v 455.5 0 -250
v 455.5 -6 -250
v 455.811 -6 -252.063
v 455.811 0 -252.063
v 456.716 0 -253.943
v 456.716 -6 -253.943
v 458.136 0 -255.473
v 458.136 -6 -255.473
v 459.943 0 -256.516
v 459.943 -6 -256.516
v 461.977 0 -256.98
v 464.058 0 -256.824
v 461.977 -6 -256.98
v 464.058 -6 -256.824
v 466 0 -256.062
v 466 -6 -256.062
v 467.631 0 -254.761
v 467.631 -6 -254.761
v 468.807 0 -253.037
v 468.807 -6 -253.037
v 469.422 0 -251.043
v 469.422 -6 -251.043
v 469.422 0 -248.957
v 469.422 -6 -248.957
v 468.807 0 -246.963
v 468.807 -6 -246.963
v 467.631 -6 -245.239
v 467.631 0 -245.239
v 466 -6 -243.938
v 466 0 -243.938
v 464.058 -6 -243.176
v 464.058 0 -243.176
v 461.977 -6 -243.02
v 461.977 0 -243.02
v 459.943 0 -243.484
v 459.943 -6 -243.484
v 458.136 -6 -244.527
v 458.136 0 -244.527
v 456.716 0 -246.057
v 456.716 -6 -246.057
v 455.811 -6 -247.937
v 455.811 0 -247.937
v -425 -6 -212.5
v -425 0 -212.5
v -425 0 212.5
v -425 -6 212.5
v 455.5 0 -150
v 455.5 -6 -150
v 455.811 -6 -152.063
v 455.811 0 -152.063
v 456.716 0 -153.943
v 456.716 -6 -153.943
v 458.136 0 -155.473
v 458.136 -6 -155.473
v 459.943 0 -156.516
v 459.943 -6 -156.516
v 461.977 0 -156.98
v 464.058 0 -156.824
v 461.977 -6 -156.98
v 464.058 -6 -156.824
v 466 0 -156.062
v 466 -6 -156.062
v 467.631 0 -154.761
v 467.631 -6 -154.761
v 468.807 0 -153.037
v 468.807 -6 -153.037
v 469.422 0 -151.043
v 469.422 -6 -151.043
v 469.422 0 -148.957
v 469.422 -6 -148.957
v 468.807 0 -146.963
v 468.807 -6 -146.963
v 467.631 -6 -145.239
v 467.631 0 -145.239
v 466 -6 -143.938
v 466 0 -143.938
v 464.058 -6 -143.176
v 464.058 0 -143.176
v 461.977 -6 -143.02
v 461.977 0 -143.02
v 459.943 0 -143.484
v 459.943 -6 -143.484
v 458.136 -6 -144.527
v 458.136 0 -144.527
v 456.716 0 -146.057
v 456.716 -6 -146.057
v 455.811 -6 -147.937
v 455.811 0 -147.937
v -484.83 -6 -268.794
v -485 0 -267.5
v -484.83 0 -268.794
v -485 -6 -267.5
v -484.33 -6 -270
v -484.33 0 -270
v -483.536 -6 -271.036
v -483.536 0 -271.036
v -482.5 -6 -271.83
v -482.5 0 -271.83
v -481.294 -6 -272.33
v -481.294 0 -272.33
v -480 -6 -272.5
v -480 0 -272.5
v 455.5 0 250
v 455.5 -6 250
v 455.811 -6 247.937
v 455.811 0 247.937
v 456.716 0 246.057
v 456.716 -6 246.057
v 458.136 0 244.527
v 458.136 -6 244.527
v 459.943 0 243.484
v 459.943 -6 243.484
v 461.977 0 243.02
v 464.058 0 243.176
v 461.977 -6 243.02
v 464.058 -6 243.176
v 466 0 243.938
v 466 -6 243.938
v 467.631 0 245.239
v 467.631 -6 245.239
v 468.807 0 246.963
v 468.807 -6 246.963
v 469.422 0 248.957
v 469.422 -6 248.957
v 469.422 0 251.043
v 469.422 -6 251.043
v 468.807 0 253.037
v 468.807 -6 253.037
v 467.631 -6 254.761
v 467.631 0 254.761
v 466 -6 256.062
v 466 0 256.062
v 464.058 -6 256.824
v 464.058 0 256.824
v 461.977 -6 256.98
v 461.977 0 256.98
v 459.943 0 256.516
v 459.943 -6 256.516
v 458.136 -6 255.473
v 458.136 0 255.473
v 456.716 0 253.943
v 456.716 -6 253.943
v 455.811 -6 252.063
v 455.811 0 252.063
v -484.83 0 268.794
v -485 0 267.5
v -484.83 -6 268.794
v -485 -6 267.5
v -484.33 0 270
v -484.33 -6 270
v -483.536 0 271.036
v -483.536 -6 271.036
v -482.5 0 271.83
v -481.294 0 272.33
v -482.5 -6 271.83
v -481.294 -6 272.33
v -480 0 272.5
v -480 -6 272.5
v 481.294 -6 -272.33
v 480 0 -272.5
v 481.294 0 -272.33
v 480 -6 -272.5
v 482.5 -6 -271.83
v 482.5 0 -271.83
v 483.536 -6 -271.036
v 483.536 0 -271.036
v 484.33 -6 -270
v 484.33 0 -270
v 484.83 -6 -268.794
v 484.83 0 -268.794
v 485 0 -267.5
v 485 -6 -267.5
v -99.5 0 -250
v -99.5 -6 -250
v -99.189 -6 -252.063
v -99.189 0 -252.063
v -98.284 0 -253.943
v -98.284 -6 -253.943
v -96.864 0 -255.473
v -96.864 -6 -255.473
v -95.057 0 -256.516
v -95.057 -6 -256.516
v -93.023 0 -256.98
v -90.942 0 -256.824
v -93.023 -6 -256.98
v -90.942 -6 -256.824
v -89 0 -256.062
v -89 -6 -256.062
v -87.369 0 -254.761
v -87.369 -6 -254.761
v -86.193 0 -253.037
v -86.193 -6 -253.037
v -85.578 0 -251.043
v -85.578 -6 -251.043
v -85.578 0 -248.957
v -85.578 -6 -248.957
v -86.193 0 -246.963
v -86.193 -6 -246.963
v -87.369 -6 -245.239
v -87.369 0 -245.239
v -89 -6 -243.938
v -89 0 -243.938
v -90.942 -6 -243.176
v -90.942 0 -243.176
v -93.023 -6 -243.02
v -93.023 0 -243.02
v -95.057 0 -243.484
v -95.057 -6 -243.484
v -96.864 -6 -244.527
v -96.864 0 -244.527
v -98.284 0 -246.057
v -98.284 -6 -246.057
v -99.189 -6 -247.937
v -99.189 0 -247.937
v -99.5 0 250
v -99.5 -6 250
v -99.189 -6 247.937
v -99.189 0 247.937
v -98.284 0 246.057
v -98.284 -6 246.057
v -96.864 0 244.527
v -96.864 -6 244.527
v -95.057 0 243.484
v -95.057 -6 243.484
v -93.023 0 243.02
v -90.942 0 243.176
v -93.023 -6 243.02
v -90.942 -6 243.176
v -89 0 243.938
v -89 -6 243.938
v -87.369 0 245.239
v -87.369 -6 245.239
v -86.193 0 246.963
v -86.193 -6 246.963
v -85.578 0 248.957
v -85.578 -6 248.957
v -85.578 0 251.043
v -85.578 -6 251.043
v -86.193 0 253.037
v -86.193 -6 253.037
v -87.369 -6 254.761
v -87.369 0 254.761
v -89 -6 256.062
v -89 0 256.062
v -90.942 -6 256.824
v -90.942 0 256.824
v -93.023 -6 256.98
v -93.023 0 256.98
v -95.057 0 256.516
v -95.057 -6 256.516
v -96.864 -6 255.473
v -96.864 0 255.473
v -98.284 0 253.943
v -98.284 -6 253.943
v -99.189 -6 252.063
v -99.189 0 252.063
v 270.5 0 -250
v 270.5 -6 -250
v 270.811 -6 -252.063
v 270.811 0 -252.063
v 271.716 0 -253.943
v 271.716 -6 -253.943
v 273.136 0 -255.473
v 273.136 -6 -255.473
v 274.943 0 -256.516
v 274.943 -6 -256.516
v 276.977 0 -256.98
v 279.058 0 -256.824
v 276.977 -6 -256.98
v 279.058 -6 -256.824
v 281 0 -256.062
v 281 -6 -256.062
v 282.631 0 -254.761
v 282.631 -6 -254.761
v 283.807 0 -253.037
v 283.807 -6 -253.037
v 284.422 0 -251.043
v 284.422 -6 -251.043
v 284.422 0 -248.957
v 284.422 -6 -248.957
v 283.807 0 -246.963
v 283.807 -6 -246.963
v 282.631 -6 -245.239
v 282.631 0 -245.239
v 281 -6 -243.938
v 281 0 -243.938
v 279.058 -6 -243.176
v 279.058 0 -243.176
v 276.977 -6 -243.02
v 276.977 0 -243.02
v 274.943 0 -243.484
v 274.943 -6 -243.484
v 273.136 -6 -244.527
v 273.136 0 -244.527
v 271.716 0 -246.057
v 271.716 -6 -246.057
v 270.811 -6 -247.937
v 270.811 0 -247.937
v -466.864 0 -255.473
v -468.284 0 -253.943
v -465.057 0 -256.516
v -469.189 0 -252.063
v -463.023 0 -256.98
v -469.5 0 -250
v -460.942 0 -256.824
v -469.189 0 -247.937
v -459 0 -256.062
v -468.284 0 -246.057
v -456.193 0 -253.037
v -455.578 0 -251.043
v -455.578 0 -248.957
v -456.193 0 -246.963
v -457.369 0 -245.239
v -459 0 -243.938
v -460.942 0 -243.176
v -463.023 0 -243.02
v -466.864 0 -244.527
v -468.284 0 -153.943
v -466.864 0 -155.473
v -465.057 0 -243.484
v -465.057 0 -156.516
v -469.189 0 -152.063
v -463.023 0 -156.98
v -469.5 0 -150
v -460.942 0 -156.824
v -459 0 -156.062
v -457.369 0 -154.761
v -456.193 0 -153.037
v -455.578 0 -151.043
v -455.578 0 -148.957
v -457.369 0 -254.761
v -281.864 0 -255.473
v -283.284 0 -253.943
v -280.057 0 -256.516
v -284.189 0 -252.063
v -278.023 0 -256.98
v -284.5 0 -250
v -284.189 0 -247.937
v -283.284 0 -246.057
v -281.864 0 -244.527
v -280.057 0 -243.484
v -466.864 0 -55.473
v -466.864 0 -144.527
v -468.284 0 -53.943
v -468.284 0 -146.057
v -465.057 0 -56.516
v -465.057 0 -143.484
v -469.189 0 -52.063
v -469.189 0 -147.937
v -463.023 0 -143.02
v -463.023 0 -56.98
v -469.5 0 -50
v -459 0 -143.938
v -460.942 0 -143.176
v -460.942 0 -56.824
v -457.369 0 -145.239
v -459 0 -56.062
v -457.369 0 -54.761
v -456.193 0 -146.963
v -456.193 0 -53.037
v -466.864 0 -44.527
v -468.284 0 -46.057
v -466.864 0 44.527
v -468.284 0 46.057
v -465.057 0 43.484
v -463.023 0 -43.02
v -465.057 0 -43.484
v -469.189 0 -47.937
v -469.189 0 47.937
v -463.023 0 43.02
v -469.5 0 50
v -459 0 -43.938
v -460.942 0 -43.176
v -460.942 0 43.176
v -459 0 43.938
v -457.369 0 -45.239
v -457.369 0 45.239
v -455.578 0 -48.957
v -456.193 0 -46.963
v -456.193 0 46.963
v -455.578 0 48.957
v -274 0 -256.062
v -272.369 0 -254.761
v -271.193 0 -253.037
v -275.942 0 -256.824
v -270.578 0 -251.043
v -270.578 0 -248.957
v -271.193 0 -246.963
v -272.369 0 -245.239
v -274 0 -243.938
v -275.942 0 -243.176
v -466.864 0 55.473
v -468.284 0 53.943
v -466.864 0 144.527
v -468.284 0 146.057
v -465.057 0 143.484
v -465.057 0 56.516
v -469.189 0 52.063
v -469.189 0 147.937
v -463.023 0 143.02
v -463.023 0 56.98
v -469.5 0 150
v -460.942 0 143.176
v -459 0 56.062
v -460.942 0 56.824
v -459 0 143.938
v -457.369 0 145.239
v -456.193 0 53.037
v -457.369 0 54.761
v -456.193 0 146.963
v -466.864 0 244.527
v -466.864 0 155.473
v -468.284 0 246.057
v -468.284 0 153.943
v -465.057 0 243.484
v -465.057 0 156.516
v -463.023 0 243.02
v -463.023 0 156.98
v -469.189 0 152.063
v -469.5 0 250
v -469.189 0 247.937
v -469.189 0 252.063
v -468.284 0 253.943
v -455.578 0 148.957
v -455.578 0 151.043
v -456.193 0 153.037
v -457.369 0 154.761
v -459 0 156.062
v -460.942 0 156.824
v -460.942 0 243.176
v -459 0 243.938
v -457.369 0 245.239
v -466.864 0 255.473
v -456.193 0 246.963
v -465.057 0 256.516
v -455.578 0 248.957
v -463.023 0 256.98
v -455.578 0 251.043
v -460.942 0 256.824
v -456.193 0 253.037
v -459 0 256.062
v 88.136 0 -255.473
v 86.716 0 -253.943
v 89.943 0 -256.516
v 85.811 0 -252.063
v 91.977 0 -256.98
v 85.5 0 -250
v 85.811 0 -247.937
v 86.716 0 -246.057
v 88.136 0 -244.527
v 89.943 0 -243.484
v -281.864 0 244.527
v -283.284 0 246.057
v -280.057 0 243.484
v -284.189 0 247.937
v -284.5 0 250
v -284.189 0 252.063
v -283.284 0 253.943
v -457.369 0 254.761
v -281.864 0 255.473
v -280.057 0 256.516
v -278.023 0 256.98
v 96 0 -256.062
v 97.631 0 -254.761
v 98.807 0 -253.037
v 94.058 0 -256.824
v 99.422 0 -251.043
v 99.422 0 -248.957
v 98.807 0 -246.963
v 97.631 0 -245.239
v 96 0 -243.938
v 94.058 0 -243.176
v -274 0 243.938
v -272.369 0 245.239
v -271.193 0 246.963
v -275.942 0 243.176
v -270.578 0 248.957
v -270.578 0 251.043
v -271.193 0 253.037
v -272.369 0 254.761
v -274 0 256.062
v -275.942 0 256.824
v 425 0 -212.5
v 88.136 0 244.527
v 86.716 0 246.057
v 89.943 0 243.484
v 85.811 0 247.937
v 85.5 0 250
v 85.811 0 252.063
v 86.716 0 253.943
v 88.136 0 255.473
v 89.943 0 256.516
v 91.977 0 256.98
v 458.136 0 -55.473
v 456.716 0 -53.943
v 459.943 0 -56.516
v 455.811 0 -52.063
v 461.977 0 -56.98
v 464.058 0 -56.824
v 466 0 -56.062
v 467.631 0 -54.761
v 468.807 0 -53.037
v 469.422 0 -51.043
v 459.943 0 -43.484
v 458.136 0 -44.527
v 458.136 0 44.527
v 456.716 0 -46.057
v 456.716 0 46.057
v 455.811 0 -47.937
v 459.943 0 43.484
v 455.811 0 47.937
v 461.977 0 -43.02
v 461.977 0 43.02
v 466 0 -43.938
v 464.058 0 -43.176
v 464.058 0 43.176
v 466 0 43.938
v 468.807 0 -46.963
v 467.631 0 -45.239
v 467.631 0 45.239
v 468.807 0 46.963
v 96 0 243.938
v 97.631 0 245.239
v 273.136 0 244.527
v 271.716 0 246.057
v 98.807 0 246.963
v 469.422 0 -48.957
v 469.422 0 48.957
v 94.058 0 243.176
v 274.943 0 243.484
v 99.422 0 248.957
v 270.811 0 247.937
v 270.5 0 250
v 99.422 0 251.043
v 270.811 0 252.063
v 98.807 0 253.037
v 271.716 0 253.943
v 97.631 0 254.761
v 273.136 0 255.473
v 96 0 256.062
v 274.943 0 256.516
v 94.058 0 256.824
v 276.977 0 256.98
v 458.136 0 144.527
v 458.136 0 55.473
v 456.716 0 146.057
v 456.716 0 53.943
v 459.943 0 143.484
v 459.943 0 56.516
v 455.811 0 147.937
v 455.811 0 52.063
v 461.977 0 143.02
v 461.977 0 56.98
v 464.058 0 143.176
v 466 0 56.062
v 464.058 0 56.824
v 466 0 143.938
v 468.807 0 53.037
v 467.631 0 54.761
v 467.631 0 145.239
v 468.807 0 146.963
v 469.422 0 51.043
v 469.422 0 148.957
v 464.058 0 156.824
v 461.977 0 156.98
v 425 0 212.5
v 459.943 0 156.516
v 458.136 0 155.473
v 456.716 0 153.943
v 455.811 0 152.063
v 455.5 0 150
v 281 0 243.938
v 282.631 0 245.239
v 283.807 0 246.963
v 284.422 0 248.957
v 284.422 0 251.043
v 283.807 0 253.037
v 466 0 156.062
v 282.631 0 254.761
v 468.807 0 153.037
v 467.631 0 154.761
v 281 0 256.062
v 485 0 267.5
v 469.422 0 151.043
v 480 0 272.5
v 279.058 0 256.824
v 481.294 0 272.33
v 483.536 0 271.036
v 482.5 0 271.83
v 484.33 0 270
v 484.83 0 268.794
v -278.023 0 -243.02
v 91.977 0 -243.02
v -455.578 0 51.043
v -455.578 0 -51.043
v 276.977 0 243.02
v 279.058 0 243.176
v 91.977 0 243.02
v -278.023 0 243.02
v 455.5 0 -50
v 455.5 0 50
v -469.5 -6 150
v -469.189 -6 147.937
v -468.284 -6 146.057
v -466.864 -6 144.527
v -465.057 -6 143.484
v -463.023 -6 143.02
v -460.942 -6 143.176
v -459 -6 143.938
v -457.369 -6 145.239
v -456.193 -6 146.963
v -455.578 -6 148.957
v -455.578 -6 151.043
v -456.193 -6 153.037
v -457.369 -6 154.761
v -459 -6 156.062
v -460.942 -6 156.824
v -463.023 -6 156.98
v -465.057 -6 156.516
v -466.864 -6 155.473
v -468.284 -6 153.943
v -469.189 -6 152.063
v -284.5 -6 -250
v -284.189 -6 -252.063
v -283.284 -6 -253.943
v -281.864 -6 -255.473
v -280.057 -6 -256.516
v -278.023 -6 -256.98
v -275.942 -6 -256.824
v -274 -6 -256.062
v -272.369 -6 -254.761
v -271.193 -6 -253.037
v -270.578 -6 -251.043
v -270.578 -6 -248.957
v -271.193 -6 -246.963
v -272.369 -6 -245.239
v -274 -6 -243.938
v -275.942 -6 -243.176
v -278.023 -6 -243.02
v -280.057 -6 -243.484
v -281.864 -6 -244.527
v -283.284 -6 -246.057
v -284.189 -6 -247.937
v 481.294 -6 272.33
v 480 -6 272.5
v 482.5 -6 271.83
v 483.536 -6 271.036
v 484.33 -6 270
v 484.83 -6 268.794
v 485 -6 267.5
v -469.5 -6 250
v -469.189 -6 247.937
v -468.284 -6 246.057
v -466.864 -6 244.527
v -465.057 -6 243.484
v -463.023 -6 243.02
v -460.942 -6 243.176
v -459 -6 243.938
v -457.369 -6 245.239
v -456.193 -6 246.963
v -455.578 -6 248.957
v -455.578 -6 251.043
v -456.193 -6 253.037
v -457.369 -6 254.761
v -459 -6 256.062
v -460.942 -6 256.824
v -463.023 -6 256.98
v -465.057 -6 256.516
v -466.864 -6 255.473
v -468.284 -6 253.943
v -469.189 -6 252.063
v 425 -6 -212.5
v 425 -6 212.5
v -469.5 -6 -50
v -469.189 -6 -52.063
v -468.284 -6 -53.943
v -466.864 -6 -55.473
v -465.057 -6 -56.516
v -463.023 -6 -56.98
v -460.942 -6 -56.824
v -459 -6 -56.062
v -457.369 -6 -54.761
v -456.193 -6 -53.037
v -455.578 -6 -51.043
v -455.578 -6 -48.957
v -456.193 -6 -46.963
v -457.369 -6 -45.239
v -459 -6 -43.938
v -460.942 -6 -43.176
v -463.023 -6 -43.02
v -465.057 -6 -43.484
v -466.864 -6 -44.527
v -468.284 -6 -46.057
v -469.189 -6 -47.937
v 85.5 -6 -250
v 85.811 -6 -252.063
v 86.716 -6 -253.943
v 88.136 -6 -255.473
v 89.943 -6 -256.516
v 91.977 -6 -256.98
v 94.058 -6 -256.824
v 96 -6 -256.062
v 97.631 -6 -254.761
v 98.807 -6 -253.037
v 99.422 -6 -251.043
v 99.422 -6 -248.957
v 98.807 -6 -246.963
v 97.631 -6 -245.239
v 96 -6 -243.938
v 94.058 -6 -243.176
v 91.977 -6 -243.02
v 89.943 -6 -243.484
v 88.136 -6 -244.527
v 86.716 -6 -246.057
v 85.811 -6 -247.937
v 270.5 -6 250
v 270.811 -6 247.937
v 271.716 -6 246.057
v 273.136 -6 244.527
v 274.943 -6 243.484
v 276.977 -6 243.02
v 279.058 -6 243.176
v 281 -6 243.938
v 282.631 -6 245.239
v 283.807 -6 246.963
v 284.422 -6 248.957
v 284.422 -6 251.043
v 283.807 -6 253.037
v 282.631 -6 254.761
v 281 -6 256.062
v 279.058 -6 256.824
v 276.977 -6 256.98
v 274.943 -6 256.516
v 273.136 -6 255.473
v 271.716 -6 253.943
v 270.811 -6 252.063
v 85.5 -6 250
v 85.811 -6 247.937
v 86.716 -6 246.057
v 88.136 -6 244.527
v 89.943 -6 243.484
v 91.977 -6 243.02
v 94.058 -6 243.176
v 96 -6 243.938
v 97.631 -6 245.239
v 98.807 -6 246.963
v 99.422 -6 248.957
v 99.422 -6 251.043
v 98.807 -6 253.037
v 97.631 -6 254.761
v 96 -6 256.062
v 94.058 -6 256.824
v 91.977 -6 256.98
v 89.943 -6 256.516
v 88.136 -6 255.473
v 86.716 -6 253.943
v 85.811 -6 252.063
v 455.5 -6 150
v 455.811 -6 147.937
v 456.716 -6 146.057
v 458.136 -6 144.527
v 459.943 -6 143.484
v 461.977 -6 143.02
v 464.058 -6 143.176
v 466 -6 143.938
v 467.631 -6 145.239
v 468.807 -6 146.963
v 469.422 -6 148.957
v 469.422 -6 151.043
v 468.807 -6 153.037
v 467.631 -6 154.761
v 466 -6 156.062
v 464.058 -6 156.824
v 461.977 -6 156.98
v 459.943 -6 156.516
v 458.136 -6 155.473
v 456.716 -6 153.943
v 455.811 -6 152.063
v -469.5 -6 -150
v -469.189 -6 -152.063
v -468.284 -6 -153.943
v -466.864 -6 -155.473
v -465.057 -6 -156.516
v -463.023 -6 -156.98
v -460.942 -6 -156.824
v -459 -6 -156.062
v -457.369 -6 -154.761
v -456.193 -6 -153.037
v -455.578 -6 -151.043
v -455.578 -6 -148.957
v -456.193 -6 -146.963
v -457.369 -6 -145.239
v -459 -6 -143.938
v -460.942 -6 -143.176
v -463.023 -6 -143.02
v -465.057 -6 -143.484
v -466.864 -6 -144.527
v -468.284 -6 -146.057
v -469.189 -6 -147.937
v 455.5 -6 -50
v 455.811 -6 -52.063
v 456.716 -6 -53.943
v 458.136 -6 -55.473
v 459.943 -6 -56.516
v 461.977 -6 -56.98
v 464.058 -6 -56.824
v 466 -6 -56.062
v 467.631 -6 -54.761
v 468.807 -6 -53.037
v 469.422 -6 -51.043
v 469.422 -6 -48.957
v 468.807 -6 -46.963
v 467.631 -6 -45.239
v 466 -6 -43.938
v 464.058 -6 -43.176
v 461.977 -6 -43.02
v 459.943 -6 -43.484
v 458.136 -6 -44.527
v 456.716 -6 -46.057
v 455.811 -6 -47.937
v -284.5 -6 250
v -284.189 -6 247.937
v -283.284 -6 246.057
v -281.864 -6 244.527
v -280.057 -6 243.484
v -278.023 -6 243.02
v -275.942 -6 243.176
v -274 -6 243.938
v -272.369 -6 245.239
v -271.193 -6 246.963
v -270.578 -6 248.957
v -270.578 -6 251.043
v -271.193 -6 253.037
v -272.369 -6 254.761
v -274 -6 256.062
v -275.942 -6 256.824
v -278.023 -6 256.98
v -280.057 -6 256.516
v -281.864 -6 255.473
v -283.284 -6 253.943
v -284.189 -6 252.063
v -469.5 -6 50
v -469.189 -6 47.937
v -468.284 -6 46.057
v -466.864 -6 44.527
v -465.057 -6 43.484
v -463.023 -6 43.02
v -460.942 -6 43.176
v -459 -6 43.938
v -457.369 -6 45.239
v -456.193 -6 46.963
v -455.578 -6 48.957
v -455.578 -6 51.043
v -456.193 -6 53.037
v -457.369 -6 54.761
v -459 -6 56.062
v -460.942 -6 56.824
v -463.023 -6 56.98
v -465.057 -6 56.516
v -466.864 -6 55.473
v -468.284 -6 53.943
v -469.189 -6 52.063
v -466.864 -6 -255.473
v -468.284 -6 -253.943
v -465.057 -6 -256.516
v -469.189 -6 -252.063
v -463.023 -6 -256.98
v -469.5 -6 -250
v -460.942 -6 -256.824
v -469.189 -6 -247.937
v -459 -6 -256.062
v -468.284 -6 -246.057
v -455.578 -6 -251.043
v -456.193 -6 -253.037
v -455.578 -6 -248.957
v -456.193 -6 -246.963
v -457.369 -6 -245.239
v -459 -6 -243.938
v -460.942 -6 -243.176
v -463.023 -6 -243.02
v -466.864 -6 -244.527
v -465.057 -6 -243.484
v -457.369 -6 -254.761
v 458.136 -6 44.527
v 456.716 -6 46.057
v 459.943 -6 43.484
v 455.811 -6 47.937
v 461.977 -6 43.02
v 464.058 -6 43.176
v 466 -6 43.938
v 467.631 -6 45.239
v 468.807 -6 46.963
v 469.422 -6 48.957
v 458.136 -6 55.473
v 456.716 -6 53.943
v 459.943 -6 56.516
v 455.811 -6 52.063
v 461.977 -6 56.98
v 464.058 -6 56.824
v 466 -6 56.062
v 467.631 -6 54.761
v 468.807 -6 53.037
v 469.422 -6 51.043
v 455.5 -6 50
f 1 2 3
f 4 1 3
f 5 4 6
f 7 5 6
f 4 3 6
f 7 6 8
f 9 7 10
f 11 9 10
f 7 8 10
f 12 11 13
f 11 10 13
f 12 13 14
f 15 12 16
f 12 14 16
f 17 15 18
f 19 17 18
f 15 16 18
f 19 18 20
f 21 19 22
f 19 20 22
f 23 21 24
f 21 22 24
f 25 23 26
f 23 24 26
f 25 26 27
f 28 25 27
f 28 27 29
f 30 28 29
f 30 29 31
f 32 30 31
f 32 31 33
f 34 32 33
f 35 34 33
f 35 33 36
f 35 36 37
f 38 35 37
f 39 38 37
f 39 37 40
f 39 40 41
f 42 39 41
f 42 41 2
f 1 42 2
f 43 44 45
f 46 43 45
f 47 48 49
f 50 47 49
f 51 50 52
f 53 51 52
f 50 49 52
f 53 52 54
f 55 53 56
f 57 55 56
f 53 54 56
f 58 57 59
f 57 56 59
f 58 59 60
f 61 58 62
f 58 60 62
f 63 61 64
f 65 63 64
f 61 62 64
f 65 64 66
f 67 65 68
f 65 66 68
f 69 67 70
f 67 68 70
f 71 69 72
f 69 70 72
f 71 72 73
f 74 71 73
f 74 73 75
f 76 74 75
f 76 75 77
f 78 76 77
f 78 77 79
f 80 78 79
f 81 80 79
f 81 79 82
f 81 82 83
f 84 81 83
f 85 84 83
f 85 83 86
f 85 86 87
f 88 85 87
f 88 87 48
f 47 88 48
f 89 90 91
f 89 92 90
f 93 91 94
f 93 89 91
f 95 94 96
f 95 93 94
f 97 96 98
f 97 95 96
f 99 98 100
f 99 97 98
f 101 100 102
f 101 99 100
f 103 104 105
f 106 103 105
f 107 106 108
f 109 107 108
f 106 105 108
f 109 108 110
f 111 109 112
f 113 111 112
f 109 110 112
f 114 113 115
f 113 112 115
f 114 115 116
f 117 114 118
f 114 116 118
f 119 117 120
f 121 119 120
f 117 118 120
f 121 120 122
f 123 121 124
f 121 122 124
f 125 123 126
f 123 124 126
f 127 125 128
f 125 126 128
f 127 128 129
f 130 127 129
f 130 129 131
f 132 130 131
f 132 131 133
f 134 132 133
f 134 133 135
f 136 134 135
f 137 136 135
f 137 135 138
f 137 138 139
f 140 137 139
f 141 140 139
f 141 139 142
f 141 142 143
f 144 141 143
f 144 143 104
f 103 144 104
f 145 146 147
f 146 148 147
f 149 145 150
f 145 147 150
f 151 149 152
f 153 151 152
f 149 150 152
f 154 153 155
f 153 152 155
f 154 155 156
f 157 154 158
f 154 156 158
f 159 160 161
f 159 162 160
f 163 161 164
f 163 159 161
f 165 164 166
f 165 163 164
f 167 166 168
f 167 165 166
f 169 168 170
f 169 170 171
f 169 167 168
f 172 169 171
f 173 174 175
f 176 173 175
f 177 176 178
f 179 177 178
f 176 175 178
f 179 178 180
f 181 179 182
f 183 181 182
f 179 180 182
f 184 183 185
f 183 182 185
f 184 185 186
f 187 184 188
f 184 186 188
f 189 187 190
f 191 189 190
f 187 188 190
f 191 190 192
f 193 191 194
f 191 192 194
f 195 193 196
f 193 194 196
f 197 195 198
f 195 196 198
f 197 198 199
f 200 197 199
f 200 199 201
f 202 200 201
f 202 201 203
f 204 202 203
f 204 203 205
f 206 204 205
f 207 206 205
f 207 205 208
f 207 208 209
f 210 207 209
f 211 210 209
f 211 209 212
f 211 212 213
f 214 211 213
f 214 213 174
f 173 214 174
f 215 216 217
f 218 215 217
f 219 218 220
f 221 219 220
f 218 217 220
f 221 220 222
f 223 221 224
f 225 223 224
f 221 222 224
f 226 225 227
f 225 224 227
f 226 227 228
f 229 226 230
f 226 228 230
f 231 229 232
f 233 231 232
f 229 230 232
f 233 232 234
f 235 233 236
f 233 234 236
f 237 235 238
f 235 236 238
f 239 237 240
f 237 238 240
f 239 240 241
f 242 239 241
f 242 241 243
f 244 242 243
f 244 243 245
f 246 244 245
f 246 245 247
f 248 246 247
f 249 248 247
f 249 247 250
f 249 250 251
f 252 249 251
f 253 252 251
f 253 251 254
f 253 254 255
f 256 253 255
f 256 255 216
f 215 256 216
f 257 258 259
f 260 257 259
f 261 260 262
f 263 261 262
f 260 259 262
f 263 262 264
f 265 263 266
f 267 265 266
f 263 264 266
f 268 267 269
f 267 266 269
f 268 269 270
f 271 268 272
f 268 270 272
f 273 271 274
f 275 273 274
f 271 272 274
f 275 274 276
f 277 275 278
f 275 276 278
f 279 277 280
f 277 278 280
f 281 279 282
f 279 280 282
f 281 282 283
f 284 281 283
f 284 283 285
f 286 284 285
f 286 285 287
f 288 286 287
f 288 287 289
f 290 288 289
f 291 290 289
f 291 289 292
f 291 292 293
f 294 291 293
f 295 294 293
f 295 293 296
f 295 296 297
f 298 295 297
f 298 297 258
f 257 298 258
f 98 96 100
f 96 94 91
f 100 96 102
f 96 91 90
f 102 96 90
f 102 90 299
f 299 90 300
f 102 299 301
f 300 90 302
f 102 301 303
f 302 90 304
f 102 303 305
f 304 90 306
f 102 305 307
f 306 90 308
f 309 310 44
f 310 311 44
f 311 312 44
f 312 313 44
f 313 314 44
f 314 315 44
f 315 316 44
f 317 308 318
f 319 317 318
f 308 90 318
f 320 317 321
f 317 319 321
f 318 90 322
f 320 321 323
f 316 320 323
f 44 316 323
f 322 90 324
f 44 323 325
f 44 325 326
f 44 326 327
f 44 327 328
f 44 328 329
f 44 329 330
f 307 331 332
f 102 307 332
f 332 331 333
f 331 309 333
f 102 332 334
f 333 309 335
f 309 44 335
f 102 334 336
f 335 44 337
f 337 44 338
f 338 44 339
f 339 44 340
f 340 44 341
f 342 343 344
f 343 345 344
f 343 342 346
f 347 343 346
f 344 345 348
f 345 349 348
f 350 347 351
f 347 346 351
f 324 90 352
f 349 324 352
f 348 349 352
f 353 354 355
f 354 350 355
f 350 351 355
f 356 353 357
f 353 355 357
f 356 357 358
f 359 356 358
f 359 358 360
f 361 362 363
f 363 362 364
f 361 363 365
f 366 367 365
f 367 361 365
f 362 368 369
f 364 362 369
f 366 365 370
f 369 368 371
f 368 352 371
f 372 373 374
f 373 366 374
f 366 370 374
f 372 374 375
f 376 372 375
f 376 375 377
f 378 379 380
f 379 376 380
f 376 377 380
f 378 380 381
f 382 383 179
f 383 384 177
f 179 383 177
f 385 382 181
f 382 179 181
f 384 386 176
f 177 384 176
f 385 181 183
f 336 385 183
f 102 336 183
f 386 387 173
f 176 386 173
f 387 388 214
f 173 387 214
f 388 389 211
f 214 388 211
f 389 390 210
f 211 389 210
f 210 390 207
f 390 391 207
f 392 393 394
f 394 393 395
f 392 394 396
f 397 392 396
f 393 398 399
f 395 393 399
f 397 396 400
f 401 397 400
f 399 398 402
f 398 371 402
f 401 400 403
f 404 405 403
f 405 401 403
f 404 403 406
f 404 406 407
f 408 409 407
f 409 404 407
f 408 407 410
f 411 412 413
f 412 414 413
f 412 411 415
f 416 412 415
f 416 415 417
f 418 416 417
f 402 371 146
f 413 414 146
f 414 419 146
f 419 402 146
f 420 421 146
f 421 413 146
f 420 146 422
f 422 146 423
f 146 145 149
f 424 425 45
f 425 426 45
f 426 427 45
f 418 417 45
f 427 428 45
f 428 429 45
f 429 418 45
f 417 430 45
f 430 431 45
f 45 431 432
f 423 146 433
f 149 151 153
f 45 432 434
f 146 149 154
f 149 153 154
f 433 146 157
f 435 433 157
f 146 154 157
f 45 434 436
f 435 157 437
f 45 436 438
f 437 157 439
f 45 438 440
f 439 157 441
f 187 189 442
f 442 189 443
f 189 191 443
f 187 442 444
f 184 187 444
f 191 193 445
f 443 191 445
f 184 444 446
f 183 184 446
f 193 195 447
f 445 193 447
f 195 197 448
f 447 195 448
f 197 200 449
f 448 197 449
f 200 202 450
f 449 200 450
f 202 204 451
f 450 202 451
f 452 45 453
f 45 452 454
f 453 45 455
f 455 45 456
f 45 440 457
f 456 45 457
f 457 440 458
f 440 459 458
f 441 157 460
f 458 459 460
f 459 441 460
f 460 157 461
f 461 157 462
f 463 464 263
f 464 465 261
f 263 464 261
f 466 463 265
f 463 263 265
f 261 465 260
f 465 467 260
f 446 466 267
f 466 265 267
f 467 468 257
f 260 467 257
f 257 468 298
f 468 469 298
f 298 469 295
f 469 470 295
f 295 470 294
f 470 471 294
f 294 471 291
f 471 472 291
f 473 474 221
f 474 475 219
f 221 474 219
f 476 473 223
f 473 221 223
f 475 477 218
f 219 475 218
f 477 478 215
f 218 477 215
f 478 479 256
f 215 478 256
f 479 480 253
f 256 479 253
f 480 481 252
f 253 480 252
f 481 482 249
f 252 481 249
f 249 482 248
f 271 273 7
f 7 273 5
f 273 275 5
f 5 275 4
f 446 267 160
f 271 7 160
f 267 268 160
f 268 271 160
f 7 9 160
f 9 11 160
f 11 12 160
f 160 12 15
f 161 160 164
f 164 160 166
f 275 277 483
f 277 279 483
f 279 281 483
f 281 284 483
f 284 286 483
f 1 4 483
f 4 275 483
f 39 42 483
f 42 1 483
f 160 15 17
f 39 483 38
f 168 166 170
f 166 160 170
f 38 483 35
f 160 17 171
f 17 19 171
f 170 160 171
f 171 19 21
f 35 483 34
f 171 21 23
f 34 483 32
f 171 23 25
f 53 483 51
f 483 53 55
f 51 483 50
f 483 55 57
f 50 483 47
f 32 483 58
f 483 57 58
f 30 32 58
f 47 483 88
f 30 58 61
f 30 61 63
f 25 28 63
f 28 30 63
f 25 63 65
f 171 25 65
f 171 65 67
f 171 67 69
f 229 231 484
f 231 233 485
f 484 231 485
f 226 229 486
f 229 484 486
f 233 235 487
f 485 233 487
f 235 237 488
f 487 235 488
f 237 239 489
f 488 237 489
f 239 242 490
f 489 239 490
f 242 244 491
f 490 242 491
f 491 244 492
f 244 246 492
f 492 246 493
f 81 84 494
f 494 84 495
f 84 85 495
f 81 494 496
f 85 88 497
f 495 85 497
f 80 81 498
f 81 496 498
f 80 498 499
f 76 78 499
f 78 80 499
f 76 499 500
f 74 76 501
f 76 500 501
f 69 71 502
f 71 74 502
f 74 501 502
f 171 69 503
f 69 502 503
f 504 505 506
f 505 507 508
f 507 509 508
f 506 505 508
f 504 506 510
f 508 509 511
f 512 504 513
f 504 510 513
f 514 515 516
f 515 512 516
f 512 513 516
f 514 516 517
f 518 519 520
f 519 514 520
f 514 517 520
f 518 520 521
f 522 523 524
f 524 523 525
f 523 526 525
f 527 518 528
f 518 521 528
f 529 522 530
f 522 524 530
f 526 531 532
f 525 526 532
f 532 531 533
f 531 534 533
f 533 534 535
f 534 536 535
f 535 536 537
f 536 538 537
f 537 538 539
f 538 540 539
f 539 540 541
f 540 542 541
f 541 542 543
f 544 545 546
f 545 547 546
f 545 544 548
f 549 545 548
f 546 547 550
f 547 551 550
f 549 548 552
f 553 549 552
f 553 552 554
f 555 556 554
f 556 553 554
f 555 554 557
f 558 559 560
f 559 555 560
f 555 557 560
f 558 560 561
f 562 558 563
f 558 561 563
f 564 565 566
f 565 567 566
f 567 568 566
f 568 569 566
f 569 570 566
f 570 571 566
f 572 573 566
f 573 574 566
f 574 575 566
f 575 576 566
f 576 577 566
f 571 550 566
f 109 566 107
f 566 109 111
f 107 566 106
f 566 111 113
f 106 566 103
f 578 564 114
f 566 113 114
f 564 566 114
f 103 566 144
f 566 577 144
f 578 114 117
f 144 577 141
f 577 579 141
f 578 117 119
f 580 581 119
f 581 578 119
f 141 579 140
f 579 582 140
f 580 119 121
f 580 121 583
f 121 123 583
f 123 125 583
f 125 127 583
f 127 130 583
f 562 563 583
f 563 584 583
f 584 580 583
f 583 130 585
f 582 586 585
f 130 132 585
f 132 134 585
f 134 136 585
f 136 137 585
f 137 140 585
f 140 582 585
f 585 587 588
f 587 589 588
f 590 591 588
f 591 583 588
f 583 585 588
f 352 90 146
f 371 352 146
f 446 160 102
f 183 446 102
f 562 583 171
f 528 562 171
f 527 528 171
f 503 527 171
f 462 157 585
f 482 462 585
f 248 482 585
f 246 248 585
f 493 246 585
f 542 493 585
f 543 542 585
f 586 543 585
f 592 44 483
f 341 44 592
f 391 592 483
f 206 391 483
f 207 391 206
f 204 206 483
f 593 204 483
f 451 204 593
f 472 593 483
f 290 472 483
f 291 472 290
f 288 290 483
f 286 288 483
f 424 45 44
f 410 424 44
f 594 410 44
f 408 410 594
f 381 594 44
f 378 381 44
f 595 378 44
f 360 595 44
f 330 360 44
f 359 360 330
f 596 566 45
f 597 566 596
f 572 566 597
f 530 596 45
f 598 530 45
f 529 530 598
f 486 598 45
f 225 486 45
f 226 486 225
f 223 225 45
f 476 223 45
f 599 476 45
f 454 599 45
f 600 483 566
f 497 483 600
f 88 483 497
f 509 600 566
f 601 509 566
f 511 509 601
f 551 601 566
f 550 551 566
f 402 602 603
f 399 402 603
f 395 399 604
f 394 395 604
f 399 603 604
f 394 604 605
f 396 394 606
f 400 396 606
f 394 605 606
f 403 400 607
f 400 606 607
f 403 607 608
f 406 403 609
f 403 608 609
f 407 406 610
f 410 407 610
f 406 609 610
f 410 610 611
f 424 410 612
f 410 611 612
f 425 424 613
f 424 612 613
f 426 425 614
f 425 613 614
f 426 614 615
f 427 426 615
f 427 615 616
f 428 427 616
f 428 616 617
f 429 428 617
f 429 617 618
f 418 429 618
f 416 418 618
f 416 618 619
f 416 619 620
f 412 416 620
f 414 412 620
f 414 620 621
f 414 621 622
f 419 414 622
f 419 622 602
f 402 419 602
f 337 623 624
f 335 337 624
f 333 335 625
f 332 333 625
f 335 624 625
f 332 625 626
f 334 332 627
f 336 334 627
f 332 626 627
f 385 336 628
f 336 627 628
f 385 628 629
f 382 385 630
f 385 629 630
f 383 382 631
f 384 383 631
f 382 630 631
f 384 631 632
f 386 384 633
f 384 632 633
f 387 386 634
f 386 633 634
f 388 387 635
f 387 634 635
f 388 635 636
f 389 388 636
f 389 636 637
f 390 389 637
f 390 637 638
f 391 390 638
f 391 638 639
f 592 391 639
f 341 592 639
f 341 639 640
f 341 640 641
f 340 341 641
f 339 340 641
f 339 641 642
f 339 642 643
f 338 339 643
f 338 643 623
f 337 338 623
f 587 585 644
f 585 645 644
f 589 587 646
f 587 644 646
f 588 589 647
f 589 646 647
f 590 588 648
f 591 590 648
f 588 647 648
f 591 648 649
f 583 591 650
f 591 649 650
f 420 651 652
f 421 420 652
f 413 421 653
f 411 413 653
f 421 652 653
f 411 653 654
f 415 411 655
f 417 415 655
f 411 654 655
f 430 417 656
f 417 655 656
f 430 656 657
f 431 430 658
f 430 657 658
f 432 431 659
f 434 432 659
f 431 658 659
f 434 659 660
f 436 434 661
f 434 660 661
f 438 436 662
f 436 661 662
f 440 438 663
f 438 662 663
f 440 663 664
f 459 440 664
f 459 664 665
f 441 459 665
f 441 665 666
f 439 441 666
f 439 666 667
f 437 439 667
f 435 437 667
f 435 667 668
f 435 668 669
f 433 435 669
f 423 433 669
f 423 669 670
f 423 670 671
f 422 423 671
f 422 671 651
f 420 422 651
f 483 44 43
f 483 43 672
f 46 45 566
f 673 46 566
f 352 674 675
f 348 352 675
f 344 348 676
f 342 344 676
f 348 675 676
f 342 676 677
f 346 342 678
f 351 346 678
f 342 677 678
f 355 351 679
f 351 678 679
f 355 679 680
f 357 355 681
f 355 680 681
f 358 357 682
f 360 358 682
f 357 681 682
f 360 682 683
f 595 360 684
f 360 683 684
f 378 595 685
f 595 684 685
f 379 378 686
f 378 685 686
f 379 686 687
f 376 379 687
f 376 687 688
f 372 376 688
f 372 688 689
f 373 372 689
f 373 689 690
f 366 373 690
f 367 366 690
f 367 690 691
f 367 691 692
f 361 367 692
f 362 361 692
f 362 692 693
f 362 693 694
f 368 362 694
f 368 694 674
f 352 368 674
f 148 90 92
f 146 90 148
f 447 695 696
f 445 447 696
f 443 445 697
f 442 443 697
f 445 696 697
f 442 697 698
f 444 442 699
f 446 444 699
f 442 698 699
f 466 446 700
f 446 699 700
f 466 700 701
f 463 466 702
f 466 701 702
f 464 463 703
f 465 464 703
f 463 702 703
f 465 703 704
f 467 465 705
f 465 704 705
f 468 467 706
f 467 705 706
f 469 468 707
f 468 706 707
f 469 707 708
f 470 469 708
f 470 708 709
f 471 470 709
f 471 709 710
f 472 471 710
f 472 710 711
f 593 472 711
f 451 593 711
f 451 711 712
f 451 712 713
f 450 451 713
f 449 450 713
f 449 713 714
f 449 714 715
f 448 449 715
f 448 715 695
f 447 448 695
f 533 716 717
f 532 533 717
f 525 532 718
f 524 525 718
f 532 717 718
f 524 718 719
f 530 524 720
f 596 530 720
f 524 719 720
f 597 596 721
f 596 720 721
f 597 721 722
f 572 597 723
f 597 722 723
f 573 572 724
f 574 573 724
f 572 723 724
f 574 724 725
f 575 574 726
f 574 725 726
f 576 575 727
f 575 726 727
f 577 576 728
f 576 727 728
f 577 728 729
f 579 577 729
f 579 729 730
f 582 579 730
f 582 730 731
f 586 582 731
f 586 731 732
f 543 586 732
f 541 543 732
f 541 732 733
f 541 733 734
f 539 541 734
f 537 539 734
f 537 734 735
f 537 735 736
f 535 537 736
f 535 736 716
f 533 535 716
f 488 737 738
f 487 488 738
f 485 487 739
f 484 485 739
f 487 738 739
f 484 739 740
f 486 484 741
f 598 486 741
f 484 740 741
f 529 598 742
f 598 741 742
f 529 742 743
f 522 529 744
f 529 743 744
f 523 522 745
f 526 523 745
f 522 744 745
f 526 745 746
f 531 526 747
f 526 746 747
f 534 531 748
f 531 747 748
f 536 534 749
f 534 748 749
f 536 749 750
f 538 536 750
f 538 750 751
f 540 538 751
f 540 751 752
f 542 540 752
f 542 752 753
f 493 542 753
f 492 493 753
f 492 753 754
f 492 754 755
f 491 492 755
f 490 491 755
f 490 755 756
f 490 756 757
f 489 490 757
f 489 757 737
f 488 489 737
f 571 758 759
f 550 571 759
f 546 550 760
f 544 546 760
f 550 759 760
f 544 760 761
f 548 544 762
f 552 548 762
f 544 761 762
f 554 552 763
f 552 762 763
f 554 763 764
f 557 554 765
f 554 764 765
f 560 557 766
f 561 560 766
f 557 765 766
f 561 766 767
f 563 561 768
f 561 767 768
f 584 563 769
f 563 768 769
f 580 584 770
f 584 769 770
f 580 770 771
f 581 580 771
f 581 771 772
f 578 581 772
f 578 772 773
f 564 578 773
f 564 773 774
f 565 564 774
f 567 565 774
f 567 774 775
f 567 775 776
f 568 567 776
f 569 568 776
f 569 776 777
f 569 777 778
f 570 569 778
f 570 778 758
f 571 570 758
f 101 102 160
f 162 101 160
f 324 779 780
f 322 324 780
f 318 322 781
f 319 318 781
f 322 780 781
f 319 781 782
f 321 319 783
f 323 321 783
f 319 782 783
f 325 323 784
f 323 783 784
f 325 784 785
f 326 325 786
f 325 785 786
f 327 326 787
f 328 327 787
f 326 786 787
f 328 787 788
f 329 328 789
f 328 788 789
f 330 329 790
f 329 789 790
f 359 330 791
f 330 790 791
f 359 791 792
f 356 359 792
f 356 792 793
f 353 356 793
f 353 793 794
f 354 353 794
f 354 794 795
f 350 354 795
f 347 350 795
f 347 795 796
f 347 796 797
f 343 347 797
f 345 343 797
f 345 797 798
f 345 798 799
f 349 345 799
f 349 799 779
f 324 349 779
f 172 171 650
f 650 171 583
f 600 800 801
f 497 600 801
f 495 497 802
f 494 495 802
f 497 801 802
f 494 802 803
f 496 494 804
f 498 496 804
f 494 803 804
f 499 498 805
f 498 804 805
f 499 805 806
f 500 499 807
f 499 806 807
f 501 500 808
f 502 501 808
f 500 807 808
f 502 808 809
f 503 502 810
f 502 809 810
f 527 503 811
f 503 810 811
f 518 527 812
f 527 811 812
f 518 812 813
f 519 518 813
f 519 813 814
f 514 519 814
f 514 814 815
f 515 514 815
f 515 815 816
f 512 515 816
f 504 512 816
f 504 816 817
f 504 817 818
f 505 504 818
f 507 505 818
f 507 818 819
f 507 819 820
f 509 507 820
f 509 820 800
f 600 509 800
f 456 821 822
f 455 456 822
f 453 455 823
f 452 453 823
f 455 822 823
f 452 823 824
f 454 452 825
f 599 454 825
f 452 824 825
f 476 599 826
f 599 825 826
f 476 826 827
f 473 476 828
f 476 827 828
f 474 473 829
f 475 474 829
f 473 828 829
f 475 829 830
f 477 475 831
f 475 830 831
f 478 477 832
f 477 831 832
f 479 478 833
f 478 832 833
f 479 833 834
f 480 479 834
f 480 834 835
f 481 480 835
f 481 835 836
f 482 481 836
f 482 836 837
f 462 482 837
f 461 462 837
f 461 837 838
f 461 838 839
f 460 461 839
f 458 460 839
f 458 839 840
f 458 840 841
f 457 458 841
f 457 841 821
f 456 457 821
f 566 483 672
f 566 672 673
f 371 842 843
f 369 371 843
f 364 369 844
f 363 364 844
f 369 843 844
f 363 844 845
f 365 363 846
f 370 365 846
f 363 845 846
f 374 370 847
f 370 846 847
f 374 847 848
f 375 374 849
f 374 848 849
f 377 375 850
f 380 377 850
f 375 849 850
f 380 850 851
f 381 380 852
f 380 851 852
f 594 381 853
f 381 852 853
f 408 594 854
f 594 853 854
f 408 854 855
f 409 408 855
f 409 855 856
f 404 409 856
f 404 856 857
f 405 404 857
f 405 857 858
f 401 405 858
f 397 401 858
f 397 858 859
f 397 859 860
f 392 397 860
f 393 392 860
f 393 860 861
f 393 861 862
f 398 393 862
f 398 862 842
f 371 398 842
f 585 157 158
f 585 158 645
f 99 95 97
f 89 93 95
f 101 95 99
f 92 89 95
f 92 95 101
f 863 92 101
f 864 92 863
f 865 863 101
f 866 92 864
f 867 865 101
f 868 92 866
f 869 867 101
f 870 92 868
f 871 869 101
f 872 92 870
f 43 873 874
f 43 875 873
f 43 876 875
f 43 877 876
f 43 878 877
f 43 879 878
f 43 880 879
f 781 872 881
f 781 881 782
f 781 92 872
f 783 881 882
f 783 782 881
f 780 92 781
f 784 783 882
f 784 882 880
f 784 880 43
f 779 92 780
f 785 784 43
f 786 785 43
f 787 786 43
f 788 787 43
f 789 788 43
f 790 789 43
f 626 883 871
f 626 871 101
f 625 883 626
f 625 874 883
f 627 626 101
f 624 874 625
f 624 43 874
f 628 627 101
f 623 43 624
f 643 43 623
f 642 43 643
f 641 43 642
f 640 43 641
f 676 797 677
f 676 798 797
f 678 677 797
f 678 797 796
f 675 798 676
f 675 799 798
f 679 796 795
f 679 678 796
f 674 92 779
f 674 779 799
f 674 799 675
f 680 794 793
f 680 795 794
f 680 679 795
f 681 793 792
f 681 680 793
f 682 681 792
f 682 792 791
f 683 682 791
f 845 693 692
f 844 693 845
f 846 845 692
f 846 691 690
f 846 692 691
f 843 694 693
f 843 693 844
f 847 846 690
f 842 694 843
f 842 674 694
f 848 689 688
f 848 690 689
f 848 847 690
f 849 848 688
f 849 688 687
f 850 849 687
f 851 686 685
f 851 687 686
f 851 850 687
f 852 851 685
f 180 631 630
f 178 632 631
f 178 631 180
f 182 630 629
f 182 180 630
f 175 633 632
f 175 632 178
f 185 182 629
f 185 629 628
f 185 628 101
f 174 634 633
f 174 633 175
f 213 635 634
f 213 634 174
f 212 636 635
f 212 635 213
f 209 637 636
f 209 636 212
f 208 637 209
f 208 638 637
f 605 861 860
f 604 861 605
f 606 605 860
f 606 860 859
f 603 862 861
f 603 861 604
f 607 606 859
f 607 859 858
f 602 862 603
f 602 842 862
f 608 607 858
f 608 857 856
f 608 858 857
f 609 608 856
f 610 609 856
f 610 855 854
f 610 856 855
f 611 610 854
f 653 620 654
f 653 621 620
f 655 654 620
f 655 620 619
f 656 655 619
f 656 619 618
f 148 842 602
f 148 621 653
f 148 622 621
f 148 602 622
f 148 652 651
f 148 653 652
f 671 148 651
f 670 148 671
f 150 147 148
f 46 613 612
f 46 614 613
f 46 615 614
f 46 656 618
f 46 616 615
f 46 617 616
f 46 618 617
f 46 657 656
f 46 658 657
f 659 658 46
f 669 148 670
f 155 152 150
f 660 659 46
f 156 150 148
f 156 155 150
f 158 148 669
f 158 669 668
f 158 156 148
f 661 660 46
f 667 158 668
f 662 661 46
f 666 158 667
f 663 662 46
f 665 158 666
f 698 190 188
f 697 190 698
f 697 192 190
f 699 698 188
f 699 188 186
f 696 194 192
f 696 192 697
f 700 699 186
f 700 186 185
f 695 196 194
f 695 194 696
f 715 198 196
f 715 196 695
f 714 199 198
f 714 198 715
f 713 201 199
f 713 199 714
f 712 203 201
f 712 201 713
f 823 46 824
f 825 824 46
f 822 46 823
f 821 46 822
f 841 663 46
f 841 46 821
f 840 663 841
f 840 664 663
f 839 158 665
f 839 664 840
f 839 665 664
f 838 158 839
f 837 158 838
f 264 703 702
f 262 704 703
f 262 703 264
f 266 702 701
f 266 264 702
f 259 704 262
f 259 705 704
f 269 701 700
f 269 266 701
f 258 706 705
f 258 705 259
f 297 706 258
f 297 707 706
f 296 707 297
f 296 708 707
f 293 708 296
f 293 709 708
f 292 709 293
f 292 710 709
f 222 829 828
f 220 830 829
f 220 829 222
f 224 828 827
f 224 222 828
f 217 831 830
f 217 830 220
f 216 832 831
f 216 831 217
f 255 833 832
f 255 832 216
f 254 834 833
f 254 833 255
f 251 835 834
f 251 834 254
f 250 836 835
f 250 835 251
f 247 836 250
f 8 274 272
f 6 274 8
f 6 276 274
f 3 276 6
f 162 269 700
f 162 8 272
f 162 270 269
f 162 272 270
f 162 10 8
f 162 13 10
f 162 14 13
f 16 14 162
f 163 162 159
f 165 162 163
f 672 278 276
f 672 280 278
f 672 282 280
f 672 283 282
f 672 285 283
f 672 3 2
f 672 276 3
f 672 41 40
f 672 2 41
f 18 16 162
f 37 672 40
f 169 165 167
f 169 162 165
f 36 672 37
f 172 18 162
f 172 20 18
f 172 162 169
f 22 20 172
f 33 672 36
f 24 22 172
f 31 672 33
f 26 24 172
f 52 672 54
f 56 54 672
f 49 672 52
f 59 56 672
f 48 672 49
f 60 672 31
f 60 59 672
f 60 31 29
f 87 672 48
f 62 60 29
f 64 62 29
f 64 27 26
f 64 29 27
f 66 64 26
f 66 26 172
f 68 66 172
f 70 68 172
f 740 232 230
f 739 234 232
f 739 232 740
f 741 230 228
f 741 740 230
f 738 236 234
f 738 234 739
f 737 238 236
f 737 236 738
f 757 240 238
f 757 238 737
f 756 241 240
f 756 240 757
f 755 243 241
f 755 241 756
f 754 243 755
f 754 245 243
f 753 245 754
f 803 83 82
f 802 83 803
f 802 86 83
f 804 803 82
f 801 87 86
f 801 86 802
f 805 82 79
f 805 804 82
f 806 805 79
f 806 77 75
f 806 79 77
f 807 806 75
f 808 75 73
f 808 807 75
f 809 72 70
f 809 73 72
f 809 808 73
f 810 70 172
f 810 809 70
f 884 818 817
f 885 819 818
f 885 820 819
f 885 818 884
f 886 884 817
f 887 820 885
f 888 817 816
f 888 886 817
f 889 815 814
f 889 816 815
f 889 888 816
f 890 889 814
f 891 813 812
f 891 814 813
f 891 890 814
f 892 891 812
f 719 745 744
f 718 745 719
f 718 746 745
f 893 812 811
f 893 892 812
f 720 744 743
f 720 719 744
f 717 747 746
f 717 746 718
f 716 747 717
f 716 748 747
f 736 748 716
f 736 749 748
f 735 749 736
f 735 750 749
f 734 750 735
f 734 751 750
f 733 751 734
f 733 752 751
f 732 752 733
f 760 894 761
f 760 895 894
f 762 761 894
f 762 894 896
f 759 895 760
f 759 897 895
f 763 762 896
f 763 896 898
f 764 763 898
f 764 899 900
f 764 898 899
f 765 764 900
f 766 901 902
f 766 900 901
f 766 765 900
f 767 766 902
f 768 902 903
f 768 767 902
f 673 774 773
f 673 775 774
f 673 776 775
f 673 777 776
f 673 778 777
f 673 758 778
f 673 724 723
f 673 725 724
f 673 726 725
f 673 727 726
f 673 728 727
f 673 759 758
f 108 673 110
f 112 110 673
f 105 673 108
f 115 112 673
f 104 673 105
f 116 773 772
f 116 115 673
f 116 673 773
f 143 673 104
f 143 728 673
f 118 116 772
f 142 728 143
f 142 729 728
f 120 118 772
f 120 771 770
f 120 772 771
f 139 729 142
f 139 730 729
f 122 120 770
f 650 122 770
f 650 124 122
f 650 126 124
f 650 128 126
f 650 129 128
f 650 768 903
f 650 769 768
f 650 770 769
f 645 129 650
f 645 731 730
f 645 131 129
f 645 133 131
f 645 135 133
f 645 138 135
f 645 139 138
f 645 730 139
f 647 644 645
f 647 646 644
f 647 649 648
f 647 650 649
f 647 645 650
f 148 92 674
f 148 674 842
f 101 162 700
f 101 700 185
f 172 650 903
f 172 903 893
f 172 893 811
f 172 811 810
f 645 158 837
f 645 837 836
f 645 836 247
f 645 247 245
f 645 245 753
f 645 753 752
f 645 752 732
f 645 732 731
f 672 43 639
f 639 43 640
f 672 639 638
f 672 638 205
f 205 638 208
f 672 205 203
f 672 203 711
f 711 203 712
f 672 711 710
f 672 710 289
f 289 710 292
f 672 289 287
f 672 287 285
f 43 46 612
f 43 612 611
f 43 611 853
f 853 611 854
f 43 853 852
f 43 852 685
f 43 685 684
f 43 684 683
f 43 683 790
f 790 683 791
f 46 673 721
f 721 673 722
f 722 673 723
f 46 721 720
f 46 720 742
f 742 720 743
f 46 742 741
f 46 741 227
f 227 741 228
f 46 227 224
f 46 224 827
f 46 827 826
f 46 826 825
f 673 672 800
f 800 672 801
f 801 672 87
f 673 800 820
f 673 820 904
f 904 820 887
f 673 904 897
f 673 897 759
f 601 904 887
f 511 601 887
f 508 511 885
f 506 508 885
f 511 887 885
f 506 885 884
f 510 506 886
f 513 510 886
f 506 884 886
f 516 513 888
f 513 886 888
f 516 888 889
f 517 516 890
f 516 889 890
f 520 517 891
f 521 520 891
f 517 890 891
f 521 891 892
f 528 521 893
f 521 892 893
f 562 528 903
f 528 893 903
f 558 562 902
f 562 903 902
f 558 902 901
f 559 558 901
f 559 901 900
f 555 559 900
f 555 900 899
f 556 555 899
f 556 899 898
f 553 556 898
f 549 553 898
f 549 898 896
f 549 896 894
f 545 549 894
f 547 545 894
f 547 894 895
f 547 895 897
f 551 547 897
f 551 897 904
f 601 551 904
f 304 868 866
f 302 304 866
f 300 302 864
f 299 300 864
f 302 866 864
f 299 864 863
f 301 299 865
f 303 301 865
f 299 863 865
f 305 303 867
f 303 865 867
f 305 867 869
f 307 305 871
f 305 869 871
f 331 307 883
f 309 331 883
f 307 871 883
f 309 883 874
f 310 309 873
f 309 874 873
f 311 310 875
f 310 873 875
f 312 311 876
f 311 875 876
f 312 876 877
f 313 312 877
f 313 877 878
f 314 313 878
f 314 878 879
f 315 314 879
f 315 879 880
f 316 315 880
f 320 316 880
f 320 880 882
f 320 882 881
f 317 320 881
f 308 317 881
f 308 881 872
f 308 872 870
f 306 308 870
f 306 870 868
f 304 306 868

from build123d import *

# Parameters (mm, degrees)
F0_W     = 970
F0_H     = 545
F0_W_2   = 850
F0_H_2   = 425
F1_DEPTH = 6
F2_R     = 5
F4_D     = 14


with BuildPart() as f1:
    # F0 (on Front) → F1 (new body)
    with BuildSketch(Plane.XZ):
        Rectangle(F0_W, F0_H)
        Rectangle(F0_W_2, F0_H_2, mode=Mode.SUBTRACT)
    extrude(amount=F1_DEPTH)

    # F2
    f2_edges = [f1.edges().sort_by_distance(p)[0] for p in [
        (-485, -3, 272.5),
        (485, -3, 272.5),
        (485, -3, -272.5),
        (-485, -3, -272.5),
    ]]
    fillet(f2_edges, radius=F2_R)

    # F4 (through all)
    with Locations(Plane(origin=(0, 0, 0), x_dir=(1, 0, 0), z_dir=(0, 1, 0))):
        with Locations((462.5, -250), (277.5, -250), (92.5, -250), (-92.5, -250), (-462.5, -250), (-462.5, -150), (-462.5, -50), (-462.5, 50), (-462.5, 150), (-462.5, 250), (-277.5, 250), (-92.5, 250), (92.5, 250), (277.5, 250), (462.5, 250), (462.5, 150), (462.5, 50), (462.5, -50), (462.5, -150), (-277.5, -250)):
            Hole(F4_D / 2)


solid = f1.part
